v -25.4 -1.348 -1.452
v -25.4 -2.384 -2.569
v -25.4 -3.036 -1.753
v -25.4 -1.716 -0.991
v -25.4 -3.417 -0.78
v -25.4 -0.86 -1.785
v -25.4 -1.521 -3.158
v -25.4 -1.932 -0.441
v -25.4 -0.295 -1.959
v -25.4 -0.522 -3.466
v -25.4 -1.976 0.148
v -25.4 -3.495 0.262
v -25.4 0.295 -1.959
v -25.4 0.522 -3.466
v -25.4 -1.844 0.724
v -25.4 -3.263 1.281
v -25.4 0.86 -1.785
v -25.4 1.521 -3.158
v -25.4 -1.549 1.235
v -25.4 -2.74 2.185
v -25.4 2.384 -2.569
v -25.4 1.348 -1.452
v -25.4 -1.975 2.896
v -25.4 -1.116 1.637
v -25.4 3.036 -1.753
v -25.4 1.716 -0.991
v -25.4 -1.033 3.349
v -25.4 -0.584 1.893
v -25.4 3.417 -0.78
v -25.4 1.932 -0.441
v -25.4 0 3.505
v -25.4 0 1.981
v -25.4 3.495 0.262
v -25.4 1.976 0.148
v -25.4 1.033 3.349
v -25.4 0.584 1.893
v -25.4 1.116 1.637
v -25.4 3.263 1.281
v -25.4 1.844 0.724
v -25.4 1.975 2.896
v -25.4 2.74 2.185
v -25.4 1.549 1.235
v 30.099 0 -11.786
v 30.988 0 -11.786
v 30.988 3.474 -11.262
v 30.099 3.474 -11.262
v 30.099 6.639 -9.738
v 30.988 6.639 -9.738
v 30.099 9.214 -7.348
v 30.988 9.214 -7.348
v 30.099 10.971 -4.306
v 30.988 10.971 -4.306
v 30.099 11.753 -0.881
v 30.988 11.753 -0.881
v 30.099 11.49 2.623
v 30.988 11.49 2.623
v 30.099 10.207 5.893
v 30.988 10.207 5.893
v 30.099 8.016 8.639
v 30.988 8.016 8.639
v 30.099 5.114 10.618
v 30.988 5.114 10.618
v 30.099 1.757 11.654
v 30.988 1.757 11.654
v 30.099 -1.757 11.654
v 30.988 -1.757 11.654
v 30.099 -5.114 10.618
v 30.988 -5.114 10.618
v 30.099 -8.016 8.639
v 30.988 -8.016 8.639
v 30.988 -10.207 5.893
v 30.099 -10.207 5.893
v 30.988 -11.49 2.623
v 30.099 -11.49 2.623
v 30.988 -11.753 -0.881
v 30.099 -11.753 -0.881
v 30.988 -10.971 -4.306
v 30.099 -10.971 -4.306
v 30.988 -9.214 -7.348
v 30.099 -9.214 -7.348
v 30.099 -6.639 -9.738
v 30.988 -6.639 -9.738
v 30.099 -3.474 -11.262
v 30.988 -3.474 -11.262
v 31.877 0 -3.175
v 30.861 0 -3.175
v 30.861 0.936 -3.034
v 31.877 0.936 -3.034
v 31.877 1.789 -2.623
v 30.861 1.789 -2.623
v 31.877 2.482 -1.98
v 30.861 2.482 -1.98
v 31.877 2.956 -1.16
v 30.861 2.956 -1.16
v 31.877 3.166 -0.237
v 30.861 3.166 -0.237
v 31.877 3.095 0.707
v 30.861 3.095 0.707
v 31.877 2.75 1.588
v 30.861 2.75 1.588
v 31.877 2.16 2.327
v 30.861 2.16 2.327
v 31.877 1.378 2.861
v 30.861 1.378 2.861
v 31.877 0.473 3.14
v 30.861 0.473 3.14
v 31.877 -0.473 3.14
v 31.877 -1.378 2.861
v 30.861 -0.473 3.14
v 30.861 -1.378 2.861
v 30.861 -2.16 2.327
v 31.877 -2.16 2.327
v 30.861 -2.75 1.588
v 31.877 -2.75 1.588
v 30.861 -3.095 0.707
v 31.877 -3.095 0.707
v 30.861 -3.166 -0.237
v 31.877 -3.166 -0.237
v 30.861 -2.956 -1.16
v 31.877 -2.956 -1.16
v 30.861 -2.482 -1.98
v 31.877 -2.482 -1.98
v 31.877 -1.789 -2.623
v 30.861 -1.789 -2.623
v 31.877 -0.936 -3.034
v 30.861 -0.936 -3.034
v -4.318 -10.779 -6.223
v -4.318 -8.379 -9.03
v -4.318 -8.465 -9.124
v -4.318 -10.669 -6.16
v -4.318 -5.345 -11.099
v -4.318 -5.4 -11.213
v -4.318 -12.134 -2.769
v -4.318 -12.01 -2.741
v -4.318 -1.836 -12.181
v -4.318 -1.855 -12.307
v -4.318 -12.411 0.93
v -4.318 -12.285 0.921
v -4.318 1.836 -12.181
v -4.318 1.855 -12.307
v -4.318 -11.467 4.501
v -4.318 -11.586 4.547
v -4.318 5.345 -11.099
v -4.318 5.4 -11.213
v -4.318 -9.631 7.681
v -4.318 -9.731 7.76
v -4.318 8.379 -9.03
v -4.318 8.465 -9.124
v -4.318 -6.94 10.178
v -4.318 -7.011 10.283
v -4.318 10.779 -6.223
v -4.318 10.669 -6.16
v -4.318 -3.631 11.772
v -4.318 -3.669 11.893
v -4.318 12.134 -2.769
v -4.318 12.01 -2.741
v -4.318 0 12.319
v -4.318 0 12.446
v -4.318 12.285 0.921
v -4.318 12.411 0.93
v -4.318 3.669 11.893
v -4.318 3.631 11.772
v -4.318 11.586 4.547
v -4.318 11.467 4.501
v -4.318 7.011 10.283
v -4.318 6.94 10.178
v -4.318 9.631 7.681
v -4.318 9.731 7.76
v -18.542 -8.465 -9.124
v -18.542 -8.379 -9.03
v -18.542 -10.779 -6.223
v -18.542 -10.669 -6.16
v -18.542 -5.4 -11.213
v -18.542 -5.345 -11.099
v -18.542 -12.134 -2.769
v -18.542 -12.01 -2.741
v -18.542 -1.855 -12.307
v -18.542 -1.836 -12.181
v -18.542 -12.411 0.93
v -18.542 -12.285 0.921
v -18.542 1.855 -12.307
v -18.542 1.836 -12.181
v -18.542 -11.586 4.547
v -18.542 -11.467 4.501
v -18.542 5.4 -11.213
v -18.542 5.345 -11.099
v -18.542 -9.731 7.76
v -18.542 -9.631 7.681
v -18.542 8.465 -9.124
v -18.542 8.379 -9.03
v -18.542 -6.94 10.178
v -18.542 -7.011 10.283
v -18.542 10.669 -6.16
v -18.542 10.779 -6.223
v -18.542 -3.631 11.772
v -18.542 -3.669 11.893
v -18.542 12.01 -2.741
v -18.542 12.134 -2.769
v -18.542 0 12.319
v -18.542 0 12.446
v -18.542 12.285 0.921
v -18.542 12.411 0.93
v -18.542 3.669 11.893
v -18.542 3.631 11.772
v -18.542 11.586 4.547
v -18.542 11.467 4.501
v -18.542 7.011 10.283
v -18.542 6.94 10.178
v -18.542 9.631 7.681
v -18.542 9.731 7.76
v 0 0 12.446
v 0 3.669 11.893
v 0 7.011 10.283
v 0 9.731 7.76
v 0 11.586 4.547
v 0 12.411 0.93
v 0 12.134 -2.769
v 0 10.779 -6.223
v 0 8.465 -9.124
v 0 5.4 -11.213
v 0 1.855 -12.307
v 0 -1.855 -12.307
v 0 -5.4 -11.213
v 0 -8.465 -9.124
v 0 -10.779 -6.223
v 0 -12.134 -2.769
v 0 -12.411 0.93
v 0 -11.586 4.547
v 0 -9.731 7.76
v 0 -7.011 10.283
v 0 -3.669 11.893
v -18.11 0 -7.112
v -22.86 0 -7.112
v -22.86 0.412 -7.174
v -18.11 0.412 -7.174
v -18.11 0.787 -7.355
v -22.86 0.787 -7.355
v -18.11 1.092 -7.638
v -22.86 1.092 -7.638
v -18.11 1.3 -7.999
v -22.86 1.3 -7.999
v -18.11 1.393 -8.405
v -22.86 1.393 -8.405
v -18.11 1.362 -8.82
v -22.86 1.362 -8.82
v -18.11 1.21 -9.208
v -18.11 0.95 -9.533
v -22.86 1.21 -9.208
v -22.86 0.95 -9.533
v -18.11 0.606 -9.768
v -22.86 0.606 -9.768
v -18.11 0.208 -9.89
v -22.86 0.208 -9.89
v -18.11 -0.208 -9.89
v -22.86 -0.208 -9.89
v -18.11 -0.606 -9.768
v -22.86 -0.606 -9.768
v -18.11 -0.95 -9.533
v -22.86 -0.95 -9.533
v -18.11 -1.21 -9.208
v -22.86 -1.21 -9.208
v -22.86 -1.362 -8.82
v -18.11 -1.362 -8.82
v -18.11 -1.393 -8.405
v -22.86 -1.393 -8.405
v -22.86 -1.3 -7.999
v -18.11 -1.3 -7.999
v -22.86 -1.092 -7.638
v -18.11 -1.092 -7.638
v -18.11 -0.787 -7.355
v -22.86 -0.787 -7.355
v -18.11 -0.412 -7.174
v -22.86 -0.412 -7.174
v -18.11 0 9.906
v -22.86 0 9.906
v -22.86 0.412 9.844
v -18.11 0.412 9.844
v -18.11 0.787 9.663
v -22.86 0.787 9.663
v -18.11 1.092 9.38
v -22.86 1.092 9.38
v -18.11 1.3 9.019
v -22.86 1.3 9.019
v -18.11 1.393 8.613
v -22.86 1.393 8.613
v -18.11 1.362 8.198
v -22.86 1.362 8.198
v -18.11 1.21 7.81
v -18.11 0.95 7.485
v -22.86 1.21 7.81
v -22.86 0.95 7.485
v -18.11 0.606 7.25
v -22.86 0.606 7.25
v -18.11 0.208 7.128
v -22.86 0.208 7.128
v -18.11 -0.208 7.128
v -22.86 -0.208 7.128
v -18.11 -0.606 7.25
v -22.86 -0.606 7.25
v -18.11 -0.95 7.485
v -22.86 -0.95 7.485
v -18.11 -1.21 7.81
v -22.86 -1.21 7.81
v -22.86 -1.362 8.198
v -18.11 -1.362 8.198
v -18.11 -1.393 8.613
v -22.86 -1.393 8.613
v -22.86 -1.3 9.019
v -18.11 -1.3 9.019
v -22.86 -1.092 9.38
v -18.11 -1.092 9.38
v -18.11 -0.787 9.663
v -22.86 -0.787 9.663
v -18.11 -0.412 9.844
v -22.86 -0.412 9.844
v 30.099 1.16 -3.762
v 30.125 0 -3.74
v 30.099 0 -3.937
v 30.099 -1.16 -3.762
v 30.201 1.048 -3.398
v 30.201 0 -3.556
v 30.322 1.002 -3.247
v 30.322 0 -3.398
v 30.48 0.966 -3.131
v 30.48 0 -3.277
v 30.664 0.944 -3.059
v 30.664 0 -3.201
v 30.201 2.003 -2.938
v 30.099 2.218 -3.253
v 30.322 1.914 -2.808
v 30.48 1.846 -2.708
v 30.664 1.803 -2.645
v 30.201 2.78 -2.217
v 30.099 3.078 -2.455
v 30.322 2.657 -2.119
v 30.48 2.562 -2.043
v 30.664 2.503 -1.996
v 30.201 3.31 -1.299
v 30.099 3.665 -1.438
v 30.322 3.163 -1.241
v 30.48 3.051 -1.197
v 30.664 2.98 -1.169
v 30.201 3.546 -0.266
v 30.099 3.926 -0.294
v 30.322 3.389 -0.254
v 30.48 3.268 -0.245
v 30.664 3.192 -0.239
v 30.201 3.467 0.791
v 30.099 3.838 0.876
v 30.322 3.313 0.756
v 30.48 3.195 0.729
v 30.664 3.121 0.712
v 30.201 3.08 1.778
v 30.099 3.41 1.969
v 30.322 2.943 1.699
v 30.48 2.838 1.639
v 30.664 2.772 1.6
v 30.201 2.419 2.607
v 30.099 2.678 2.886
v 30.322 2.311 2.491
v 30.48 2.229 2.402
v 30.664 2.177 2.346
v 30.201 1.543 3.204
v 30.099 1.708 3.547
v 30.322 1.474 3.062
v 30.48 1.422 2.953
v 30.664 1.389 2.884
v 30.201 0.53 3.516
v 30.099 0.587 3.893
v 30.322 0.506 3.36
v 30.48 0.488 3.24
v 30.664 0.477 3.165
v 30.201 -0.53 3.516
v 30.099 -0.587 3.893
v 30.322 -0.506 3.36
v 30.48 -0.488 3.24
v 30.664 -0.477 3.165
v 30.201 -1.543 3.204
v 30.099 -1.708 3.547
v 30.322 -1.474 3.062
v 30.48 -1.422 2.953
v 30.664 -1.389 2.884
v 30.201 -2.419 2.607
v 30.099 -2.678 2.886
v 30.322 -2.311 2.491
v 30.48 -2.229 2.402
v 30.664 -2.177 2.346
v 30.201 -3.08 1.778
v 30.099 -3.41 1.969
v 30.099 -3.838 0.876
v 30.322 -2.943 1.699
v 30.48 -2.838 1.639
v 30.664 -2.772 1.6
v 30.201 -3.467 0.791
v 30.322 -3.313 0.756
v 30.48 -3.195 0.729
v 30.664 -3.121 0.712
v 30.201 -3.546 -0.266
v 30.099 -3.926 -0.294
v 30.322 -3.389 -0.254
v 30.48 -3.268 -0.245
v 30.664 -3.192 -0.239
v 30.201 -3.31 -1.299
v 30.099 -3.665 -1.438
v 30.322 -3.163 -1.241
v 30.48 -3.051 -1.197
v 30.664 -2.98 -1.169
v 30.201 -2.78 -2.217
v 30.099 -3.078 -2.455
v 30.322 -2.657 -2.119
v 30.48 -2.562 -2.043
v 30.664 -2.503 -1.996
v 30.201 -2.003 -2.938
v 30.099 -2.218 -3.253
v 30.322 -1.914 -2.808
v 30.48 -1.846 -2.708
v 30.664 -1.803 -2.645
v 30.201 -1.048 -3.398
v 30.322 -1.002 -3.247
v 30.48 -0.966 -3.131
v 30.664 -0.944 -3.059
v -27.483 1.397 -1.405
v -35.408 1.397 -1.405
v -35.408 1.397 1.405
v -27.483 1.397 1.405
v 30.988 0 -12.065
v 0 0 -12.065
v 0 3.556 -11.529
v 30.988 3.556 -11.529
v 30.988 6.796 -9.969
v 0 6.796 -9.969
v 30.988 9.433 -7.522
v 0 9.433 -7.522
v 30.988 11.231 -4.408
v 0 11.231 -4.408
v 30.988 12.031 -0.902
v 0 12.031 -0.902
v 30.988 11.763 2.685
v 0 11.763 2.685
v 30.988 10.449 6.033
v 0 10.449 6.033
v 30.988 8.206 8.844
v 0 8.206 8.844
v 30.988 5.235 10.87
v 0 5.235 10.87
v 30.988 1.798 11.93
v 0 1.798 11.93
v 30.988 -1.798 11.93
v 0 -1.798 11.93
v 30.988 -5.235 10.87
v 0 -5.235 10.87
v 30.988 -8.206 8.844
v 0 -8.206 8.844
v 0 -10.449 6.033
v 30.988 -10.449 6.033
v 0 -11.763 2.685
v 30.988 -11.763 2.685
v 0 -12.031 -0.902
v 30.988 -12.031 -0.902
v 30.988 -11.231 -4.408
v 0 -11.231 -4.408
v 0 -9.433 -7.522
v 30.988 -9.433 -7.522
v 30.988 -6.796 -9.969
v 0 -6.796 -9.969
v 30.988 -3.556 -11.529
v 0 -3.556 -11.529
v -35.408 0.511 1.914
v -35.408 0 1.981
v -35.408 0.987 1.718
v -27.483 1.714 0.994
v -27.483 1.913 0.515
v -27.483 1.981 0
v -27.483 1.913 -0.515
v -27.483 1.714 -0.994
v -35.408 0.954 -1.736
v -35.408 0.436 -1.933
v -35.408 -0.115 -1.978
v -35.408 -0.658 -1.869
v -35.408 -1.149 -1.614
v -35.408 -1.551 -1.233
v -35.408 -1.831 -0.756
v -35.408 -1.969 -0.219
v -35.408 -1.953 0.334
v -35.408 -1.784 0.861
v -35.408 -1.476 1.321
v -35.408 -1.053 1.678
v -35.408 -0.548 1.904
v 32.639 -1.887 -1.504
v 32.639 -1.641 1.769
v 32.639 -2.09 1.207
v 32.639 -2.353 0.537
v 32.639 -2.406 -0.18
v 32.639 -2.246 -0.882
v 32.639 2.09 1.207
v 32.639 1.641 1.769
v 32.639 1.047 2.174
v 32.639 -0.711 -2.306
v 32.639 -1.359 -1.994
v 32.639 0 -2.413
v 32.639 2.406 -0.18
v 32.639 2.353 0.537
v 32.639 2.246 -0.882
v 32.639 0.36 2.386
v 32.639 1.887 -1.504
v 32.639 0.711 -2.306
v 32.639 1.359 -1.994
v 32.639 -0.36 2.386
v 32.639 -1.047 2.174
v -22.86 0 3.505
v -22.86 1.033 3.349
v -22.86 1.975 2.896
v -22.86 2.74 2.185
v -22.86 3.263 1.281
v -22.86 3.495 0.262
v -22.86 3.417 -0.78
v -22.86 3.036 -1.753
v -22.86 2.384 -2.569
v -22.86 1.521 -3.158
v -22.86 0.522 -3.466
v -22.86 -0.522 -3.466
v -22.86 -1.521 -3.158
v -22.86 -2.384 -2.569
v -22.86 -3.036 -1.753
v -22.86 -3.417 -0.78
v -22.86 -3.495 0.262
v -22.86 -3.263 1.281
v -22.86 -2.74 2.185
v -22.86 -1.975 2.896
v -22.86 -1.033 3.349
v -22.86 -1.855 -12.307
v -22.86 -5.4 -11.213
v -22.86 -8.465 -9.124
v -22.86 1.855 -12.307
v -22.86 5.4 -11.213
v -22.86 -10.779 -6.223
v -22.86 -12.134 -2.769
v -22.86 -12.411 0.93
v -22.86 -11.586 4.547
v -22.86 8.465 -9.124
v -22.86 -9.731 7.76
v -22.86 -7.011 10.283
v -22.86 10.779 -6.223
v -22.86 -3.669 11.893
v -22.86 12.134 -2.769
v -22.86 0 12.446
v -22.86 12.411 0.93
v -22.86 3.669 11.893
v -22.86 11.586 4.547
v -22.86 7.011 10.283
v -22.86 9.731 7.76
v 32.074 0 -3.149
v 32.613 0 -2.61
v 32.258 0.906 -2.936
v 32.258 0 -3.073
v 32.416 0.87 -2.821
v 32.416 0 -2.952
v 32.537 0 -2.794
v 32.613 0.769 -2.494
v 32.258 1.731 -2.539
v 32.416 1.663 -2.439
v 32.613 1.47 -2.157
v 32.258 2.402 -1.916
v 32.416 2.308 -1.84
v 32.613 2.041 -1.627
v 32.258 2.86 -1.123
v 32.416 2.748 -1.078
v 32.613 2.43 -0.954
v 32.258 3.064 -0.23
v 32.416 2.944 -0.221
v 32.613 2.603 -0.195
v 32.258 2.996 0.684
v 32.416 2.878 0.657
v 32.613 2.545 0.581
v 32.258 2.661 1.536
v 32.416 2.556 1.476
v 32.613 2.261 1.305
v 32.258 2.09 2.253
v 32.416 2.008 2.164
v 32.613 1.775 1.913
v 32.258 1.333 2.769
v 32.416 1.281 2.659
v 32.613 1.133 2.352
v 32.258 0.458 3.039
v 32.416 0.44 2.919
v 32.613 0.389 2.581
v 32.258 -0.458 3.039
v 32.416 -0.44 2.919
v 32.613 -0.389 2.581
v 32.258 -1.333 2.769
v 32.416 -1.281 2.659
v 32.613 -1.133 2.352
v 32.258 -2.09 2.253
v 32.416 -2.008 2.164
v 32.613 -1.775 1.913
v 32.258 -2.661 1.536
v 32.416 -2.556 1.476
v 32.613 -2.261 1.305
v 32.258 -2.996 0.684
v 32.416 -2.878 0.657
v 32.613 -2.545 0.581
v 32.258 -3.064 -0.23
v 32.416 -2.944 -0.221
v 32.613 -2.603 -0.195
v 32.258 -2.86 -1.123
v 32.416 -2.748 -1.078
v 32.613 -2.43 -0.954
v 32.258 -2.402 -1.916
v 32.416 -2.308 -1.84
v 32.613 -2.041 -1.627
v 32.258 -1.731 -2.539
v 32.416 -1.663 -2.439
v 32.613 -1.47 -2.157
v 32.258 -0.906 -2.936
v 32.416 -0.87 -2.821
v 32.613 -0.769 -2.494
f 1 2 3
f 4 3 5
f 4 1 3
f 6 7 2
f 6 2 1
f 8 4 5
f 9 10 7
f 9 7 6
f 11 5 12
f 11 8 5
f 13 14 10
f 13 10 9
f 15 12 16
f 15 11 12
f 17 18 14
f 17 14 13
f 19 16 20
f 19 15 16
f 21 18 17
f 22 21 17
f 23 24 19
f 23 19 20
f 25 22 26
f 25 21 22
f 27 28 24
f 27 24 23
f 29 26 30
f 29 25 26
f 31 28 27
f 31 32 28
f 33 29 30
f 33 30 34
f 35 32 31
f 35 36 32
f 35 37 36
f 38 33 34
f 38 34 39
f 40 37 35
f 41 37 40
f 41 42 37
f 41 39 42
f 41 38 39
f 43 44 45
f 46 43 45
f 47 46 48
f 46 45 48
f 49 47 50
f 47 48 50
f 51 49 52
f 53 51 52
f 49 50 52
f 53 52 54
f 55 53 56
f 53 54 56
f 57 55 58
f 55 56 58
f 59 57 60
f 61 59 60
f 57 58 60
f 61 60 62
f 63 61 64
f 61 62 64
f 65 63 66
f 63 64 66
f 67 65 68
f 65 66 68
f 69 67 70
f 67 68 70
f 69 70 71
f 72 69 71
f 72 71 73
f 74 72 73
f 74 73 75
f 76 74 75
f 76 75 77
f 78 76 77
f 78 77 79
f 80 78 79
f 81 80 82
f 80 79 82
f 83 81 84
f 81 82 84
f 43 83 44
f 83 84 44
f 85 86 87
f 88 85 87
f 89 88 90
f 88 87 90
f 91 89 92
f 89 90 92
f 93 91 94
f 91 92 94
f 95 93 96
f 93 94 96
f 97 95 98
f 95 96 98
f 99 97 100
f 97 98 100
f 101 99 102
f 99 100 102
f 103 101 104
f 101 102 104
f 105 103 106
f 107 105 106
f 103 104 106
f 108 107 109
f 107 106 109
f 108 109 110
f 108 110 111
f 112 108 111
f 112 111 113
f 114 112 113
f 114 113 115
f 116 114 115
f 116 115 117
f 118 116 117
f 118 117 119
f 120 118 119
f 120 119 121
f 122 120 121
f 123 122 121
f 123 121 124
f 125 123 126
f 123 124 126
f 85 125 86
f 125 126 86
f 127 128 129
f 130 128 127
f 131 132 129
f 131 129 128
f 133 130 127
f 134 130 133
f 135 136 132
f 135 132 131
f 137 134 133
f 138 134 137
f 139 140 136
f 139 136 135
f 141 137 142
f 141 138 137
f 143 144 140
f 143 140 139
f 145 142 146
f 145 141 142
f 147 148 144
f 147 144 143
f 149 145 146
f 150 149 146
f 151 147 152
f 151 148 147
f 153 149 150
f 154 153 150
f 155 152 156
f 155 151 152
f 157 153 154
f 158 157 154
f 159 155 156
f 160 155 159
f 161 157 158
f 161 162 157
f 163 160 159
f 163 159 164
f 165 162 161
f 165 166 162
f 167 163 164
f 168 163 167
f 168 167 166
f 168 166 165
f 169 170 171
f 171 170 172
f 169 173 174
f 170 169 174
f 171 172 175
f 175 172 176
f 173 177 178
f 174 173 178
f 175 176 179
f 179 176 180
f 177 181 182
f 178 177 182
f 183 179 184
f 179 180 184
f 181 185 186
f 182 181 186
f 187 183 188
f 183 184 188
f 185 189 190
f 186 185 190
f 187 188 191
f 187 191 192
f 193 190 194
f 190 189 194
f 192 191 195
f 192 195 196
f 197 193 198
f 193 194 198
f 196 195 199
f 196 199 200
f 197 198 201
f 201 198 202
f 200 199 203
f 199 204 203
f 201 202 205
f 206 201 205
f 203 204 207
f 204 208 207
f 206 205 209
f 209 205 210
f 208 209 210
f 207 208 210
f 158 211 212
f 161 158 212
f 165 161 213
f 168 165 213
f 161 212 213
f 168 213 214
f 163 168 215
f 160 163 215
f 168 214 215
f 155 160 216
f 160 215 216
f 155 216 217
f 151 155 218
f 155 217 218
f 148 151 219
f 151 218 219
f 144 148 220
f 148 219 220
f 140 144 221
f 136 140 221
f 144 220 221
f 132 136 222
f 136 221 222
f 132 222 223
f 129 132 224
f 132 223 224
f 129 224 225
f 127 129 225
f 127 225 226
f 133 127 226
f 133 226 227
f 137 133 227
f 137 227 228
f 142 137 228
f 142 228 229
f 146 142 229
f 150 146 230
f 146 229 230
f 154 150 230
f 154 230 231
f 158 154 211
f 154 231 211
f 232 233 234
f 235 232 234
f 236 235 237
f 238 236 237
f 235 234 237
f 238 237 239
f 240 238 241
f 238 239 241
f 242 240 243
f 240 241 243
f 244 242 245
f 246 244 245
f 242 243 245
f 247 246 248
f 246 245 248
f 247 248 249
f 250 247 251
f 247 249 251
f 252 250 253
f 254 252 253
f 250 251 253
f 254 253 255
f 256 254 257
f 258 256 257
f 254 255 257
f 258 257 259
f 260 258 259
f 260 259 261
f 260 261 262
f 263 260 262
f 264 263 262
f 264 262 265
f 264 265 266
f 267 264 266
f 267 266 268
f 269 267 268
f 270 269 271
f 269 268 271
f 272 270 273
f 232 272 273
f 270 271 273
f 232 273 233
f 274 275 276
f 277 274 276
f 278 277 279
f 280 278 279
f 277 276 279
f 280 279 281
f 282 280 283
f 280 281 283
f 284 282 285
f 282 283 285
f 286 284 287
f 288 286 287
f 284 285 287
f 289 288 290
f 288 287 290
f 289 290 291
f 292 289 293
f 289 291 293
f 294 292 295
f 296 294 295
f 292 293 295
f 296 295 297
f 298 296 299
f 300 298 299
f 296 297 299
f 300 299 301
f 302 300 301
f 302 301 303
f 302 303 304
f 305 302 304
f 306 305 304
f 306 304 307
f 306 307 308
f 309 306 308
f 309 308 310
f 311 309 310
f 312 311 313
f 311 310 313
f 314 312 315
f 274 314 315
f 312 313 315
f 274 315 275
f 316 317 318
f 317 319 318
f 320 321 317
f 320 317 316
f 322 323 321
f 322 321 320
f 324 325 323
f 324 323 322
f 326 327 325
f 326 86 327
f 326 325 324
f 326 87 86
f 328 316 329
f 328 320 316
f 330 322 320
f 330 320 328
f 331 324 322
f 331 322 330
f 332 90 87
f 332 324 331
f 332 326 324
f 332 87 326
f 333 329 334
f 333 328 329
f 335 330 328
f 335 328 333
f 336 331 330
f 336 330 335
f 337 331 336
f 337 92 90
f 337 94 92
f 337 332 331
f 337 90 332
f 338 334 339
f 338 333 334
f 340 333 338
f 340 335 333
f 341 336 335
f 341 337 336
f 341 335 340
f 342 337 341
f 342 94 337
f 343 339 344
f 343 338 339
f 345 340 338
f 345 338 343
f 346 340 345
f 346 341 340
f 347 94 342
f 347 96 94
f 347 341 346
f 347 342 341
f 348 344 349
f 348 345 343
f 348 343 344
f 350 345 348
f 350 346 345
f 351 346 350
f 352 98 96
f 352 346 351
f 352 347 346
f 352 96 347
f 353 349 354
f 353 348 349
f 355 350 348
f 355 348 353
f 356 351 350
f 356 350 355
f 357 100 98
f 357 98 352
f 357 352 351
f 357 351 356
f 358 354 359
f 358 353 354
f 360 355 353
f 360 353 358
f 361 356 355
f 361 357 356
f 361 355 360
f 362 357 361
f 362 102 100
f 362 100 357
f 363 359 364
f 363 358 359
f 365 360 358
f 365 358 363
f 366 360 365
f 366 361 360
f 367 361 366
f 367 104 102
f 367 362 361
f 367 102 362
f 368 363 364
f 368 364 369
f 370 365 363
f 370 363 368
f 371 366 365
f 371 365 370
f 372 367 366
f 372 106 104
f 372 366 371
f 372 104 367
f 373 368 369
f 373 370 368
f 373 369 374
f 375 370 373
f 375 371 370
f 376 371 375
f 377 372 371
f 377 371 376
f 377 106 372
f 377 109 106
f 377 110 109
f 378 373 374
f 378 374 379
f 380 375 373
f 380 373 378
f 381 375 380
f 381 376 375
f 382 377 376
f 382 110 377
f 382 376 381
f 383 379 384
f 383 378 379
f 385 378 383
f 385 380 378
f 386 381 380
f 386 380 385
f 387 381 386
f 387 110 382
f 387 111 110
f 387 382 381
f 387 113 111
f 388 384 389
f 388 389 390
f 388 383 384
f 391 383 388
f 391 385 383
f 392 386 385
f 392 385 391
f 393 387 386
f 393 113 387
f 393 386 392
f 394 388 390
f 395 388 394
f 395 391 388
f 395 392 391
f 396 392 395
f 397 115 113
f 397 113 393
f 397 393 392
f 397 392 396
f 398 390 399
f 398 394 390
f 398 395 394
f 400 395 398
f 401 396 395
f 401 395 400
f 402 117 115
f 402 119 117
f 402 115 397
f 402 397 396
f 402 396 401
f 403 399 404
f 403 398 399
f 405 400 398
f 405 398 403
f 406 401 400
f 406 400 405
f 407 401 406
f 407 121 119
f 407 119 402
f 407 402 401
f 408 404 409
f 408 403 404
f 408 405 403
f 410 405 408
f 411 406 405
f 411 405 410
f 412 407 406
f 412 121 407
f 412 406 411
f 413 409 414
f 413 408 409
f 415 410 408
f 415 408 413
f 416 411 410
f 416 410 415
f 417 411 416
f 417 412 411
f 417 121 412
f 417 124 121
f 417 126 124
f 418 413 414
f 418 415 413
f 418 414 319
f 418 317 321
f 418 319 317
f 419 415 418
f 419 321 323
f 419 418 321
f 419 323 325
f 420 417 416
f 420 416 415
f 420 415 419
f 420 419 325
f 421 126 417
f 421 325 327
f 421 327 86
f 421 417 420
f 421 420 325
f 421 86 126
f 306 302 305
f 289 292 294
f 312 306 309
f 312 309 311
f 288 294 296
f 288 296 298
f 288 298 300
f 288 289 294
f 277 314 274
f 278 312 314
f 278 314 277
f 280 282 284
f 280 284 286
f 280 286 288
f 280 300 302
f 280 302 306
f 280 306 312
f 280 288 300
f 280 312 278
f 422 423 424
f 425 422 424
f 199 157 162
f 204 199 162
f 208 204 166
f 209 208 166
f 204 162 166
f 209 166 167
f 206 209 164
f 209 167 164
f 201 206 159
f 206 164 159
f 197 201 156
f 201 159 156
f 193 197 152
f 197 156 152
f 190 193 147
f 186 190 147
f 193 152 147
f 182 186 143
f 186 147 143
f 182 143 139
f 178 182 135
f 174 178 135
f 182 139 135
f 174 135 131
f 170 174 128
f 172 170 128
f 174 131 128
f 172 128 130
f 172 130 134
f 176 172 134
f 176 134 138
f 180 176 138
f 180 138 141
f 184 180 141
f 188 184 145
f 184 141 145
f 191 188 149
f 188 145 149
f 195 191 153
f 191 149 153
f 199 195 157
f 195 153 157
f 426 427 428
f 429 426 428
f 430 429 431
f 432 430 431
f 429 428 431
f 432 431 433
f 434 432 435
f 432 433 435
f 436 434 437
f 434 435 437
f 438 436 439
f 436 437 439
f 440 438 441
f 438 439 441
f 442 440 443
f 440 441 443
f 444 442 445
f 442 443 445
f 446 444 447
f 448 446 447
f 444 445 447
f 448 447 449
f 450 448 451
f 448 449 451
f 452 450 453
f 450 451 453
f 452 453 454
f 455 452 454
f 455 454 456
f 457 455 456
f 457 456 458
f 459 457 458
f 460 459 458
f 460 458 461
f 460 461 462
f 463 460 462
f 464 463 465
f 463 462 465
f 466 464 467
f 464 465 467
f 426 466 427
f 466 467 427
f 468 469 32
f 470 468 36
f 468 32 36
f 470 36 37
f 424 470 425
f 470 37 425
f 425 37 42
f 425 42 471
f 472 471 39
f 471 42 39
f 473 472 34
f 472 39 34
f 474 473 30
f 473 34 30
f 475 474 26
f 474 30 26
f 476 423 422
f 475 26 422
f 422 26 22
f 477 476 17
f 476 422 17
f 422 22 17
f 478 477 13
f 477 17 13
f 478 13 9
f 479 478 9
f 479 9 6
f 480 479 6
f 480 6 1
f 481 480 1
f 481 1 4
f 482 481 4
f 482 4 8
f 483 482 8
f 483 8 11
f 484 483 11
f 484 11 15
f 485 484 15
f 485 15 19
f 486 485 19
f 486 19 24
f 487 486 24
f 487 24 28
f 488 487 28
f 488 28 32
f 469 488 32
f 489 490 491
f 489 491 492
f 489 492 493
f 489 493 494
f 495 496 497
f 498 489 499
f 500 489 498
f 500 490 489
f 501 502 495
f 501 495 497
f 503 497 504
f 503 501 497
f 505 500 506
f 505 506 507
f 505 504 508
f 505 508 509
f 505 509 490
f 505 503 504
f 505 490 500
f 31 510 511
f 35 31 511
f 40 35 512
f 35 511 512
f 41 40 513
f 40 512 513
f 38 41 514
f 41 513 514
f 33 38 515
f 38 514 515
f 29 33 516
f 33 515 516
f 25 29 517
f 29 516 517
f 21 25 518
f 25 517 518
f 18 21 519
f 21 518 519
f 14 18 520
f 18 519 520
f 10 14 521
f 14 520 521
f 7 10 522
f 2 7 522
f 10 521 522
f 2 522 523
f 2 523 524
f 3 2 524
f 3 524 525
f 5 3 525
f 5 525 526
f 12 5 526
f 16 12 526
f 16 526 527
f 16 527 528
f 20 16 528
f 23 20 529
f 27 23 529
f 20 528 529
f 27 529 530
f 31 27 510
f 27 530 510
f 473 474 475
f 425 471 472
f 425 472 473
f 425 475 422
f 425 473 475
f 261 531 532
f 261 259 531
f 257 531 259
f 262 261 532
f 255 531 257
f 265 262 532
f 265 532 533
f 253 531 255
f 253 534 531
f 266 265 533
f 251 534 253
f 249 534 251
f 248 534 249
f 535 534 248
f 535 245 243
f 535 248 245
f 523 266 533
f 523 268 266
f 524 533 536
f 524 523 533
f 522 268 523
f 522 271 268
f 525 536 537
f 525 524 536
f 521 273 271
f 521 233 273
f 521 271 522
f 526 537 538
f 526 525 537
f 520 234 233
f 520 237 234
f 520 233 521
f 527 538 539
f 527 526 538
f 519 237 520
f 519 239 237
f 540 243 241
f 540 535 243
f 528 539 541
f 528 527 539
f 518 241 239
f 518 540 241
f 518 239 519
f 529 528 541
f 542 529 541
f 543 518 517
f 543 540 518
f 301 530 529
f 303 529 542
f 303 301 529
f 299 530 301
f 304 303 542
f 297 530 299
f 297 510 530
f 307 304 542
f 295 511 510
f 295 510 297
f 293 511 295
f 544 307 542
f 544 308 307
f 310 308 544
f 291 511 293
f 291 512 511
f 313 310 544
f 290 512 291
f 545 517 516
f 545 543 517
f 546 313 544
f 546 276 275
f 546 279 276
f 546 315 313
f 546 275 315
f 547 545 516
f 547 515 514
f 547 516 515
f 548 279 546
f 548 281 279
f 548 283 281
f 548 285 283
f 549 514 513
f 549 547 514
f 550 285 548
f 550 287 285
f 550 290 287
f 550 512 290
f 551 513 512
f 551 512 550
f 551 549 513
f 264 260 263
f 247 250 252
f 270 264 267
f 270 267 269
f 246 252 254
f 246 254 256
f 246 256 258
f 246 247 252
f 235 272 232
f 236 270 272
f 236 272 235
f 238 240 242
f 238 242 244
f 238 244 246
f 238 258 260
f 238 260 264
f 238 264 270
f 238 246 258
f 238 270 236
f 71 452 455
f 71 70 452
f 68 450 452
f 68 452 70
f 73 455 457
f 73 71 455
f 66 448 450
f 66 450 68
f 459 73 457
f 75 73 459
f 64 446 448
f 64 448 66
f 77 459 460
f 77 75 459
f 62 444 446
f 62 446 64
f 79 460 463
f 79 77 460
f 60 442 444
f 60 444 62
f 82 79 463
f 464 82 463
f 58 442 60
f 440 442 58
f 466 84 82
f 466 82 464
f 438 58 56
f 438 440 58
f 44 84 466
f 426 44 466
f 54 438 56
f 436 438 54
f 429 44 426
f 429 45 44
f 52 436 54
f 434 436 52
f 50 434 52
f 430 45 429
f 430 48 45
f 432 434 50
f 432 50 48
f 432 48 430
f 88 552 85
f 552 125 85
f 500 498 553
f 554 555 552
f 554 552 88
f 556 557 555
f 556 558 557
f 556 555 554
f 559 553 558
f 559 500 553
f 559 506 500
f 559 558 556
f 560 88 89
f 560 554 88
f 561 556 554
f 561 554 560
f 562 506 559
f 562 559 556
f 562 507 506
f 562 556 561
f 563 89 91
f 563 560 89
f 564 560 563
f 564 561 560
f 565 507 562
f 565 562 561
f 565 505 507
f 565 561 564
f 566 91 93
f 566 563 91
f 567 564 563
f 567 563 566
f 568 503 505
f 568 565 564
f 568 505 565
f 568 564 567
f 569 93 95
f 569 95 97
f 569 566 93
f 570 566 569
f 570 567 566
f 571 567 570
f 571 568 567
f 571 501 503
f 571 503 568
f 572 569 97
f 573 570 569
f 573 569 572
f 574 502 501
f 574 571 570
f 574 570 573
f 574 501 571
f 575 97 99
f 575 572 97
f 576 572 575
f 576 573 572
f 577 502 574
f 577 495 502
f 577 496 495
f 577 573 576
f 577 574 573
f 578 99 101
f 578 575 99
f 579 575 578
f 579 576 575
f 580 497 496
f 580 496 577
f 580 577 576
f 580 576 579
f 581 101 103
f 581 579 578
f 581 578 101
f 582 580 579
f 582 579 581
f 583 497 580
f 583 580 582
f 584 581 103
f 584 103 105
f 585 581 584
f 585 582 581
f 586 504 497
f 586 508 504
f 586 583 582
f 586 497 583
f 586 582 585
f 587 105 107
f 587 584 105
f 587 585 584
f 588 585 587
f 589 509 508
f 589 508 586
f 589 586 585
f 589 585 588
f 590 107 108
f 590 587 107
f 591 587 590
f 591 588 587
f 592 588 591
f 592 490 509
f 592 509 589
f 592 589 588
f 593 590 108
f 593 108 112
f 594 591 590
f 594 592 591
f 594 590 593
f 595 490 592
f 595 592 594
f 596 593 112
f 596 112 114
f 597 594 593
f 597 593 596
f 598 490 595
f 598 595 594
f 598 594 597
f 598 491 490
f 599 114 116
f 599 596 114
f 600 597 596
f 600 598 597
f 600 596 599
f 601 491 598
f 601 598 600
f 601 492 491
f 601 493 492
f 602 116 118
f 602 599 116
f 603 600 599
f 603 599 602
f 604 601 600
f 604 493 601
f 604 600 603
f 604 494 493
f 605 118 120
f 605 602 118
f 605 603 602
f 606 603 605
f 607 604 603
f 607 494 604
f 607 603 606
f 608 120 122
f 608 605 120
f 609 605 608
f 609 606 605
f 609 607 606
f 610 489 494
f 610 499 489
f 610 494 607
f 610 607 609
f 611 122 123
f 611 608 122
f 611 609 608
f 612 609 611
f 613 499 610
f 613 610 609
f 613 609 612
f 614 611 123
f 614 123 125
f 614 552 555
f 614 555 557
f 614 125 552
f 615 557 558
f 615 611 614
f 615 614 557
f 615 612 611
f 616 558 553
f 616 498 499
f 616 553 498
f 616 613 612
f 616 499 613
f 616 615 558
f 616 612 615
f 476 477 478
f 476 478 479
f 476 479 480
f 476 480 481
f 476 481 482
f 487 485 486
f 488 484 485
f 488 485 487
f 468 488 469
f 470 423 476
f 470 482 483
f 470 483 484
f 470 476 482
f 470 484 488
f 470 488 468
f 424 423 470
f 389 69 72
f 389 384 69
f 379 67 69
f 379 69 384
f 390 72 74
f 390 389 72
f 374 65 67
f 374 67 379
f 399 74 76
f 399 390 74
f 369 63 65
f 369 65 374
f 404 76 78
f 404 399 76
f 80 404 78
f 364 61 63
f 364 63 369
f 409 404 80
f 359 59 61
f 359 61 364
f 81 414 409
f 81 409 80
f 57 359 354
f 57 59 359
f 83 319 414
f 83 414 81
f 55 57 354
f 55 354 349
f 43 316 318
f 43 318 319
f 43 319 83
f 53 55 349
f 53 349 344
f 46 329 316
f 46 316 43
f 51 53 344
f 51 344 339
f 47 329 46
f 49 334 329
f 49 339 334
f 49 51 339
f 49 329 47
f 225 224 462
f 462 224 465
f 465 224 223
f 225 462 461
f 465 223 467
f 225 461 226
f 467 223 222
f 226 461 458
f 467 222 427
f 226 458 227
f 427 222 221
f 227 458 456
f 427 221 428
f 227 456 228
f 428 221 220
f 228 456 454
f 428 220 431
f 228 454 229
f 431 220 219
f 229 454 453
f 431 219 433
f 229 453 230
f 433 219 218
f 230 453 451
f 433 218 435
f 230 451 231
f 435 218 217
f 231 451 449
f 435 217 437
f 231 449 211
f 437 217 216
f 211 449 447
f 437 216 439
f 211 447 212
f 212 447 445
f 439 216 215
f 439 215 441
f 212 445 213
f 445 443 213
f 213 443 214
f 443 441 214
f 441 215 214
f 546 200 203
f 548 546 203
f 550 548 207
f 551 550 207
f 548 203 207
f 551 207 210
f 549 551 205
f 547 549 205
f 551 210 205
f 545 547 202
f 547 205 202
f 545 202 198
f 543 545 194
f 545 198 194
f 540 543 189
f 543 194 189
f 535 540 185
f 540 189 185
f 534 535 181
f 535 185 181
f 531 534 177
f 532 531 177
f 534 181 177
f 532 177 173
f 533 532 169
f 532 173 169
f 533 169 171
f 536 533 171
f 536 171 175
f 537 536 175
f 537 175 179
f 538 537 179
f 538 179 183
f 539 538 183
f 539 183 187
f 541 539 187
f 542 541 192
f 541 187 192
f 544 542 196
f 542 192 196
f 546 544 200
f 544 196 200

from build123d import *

# Parameters (mm, degrees)
SKETCH1_R           = 12.065
BOSS_EXTRUDE1_DEPTH = 30.988
SKETCH2_R           = 12.446
BOSS_EXTRUDE2_DEPTH = 4.318
SKETCH3_R           = 12.319
BOSS_EXTRUDE3_DEPTH = 14.224
SKETCH4_R           = 12.446
BOSS_EXTRUDE4_DEPTH = 4.318
SKETCH5_R           = 3.5052
BOSS_EXTRUDE5_DEPTH = 2.54
SKETCH6_R           = 1.9812
BOSS_EXTRUDE6_DEPTH = 10.0076
CUT_EXTRUDE1_DEPTH  = 7.9248
SKETCH8_R           = 11.7856
CUT_EXTRUDE2_DEPTH  = 0.889
SKETCH9_R           = 3.175
BOSS_EXTRUDE7_DEPTH = 2.54
FILLET1_R           = 0.762
SKETCH10_R          = 1.397
CUT_EXTRUDE3_DEPTH  = 4.7498


with BuildPart() as part:
    # Sketch1 → Boss-Extrude1 (new body)
    with BuildSketch(Plane(origin=(0, 0, 0), x_dir=(0, 0, -1), z_dir=(1, 0, 0))):
        Circle(SKETCH1_R)
    extrude(amount=BOSS_EXTRUDE1_DEPTH)

    # Sketch2 → Boss-Extrude2 (add)
    with BuildSketch(Plane.ZY):
        Circle(SKETCH2_R)
    extrude(amount=BOSS_EXTRUDE2_DEPTH)

    # Sketch3 → Boss-Extrude3 (add)
    with BuildSketch(Plane.ZY.offset(4.318)):
        Circle(SKETCH3_R)
    extrude(amount=BOSS_EXTRUDE3_DEPTH)

    # Sketch4 → Boss-Extrude4 (add)
    with BuildSketch(Plane.ZY.offset(18.542)):
        Circle(SKETCH4_R)
    extrude(amount=BOSS_EXTRUDE4_DEPTH)

    # Sketch5 → Boss-Extrude5 (add)
    with BuildSketch(Plane.ZY.offset(22.86)):
        Circle(SKETCH5_R)
    extrude(amount=BOSS_EXTRUDE5_DEPTH)

    # Sketch6 → Boss-Extrude6 (add)
    with BuildSketch(Plane.ZY.offset(25.4)):
        Circle(SKETCH6_R)
    extrude(amount=BOSS_EXTRUDE6_DEPTH)

    # Sketch7 → Cut-Extrude1 (cut)
    with BuildSketch(Plane.ZY.offset(35.4076)):
        with BuildLine():
            Line((-1.404828972, 1.397), (1.404828972, 1.397))
            ThreePointArc((1.404828972, 1.397), (0, 1.9812), (-1.404828972, 1.397))
        make_face()
    extrude(amount=-CUT_EXTRUDE1_DEPTH, mode=Mode.SUBTRACT)

    # Sketch8 → Cut-Extrude2 (cut)
    with BuildSketch(Plane(origin=(30.988, 0, 0), x_dir=(0, 0, -1), z_dir=(1, 0, 0))):
        Circle(SKETCH8_R)
    extrude(amount=-CUT_EXTRUDE2_DEPTH, mode=Mode.SUBTRACT)

    # Sketch9 → Boss-Extrude7 (add)
    with BuildSketch(Plane(origin=(30.099, 0, 0), x_dir=(0, 0, -1), z_dir=(1, 0, 0))):
        Circle(SKETCH9_R)
    extrude(amount=BOSS_EXTRUDE7_DEPTH)

    # Fillet1
    fillet1_edges = [part.edges().sort_by_distance(p)[0] for p in [
        (30.099, 0, 3.175),
        (32.639, 0, 3.175),
    ]]
    fillet(fillet1_edges, radius=FILLET1_R)

    # Sketch10 → Cut-Extrude3 (cut)
    with BuildSketch(Plane.ZY.offset(22.86)):
        with Locations((8.509, 0)):
            Circle(SKETCH10_R)
        with Locations((-8.509, 0)):
            Circle(SKETCH10_R)
    extrude(amount=-CUT_EXTRUDE3_DEPTH, mode=Mode.SUBTRACT)


solid = part.part
